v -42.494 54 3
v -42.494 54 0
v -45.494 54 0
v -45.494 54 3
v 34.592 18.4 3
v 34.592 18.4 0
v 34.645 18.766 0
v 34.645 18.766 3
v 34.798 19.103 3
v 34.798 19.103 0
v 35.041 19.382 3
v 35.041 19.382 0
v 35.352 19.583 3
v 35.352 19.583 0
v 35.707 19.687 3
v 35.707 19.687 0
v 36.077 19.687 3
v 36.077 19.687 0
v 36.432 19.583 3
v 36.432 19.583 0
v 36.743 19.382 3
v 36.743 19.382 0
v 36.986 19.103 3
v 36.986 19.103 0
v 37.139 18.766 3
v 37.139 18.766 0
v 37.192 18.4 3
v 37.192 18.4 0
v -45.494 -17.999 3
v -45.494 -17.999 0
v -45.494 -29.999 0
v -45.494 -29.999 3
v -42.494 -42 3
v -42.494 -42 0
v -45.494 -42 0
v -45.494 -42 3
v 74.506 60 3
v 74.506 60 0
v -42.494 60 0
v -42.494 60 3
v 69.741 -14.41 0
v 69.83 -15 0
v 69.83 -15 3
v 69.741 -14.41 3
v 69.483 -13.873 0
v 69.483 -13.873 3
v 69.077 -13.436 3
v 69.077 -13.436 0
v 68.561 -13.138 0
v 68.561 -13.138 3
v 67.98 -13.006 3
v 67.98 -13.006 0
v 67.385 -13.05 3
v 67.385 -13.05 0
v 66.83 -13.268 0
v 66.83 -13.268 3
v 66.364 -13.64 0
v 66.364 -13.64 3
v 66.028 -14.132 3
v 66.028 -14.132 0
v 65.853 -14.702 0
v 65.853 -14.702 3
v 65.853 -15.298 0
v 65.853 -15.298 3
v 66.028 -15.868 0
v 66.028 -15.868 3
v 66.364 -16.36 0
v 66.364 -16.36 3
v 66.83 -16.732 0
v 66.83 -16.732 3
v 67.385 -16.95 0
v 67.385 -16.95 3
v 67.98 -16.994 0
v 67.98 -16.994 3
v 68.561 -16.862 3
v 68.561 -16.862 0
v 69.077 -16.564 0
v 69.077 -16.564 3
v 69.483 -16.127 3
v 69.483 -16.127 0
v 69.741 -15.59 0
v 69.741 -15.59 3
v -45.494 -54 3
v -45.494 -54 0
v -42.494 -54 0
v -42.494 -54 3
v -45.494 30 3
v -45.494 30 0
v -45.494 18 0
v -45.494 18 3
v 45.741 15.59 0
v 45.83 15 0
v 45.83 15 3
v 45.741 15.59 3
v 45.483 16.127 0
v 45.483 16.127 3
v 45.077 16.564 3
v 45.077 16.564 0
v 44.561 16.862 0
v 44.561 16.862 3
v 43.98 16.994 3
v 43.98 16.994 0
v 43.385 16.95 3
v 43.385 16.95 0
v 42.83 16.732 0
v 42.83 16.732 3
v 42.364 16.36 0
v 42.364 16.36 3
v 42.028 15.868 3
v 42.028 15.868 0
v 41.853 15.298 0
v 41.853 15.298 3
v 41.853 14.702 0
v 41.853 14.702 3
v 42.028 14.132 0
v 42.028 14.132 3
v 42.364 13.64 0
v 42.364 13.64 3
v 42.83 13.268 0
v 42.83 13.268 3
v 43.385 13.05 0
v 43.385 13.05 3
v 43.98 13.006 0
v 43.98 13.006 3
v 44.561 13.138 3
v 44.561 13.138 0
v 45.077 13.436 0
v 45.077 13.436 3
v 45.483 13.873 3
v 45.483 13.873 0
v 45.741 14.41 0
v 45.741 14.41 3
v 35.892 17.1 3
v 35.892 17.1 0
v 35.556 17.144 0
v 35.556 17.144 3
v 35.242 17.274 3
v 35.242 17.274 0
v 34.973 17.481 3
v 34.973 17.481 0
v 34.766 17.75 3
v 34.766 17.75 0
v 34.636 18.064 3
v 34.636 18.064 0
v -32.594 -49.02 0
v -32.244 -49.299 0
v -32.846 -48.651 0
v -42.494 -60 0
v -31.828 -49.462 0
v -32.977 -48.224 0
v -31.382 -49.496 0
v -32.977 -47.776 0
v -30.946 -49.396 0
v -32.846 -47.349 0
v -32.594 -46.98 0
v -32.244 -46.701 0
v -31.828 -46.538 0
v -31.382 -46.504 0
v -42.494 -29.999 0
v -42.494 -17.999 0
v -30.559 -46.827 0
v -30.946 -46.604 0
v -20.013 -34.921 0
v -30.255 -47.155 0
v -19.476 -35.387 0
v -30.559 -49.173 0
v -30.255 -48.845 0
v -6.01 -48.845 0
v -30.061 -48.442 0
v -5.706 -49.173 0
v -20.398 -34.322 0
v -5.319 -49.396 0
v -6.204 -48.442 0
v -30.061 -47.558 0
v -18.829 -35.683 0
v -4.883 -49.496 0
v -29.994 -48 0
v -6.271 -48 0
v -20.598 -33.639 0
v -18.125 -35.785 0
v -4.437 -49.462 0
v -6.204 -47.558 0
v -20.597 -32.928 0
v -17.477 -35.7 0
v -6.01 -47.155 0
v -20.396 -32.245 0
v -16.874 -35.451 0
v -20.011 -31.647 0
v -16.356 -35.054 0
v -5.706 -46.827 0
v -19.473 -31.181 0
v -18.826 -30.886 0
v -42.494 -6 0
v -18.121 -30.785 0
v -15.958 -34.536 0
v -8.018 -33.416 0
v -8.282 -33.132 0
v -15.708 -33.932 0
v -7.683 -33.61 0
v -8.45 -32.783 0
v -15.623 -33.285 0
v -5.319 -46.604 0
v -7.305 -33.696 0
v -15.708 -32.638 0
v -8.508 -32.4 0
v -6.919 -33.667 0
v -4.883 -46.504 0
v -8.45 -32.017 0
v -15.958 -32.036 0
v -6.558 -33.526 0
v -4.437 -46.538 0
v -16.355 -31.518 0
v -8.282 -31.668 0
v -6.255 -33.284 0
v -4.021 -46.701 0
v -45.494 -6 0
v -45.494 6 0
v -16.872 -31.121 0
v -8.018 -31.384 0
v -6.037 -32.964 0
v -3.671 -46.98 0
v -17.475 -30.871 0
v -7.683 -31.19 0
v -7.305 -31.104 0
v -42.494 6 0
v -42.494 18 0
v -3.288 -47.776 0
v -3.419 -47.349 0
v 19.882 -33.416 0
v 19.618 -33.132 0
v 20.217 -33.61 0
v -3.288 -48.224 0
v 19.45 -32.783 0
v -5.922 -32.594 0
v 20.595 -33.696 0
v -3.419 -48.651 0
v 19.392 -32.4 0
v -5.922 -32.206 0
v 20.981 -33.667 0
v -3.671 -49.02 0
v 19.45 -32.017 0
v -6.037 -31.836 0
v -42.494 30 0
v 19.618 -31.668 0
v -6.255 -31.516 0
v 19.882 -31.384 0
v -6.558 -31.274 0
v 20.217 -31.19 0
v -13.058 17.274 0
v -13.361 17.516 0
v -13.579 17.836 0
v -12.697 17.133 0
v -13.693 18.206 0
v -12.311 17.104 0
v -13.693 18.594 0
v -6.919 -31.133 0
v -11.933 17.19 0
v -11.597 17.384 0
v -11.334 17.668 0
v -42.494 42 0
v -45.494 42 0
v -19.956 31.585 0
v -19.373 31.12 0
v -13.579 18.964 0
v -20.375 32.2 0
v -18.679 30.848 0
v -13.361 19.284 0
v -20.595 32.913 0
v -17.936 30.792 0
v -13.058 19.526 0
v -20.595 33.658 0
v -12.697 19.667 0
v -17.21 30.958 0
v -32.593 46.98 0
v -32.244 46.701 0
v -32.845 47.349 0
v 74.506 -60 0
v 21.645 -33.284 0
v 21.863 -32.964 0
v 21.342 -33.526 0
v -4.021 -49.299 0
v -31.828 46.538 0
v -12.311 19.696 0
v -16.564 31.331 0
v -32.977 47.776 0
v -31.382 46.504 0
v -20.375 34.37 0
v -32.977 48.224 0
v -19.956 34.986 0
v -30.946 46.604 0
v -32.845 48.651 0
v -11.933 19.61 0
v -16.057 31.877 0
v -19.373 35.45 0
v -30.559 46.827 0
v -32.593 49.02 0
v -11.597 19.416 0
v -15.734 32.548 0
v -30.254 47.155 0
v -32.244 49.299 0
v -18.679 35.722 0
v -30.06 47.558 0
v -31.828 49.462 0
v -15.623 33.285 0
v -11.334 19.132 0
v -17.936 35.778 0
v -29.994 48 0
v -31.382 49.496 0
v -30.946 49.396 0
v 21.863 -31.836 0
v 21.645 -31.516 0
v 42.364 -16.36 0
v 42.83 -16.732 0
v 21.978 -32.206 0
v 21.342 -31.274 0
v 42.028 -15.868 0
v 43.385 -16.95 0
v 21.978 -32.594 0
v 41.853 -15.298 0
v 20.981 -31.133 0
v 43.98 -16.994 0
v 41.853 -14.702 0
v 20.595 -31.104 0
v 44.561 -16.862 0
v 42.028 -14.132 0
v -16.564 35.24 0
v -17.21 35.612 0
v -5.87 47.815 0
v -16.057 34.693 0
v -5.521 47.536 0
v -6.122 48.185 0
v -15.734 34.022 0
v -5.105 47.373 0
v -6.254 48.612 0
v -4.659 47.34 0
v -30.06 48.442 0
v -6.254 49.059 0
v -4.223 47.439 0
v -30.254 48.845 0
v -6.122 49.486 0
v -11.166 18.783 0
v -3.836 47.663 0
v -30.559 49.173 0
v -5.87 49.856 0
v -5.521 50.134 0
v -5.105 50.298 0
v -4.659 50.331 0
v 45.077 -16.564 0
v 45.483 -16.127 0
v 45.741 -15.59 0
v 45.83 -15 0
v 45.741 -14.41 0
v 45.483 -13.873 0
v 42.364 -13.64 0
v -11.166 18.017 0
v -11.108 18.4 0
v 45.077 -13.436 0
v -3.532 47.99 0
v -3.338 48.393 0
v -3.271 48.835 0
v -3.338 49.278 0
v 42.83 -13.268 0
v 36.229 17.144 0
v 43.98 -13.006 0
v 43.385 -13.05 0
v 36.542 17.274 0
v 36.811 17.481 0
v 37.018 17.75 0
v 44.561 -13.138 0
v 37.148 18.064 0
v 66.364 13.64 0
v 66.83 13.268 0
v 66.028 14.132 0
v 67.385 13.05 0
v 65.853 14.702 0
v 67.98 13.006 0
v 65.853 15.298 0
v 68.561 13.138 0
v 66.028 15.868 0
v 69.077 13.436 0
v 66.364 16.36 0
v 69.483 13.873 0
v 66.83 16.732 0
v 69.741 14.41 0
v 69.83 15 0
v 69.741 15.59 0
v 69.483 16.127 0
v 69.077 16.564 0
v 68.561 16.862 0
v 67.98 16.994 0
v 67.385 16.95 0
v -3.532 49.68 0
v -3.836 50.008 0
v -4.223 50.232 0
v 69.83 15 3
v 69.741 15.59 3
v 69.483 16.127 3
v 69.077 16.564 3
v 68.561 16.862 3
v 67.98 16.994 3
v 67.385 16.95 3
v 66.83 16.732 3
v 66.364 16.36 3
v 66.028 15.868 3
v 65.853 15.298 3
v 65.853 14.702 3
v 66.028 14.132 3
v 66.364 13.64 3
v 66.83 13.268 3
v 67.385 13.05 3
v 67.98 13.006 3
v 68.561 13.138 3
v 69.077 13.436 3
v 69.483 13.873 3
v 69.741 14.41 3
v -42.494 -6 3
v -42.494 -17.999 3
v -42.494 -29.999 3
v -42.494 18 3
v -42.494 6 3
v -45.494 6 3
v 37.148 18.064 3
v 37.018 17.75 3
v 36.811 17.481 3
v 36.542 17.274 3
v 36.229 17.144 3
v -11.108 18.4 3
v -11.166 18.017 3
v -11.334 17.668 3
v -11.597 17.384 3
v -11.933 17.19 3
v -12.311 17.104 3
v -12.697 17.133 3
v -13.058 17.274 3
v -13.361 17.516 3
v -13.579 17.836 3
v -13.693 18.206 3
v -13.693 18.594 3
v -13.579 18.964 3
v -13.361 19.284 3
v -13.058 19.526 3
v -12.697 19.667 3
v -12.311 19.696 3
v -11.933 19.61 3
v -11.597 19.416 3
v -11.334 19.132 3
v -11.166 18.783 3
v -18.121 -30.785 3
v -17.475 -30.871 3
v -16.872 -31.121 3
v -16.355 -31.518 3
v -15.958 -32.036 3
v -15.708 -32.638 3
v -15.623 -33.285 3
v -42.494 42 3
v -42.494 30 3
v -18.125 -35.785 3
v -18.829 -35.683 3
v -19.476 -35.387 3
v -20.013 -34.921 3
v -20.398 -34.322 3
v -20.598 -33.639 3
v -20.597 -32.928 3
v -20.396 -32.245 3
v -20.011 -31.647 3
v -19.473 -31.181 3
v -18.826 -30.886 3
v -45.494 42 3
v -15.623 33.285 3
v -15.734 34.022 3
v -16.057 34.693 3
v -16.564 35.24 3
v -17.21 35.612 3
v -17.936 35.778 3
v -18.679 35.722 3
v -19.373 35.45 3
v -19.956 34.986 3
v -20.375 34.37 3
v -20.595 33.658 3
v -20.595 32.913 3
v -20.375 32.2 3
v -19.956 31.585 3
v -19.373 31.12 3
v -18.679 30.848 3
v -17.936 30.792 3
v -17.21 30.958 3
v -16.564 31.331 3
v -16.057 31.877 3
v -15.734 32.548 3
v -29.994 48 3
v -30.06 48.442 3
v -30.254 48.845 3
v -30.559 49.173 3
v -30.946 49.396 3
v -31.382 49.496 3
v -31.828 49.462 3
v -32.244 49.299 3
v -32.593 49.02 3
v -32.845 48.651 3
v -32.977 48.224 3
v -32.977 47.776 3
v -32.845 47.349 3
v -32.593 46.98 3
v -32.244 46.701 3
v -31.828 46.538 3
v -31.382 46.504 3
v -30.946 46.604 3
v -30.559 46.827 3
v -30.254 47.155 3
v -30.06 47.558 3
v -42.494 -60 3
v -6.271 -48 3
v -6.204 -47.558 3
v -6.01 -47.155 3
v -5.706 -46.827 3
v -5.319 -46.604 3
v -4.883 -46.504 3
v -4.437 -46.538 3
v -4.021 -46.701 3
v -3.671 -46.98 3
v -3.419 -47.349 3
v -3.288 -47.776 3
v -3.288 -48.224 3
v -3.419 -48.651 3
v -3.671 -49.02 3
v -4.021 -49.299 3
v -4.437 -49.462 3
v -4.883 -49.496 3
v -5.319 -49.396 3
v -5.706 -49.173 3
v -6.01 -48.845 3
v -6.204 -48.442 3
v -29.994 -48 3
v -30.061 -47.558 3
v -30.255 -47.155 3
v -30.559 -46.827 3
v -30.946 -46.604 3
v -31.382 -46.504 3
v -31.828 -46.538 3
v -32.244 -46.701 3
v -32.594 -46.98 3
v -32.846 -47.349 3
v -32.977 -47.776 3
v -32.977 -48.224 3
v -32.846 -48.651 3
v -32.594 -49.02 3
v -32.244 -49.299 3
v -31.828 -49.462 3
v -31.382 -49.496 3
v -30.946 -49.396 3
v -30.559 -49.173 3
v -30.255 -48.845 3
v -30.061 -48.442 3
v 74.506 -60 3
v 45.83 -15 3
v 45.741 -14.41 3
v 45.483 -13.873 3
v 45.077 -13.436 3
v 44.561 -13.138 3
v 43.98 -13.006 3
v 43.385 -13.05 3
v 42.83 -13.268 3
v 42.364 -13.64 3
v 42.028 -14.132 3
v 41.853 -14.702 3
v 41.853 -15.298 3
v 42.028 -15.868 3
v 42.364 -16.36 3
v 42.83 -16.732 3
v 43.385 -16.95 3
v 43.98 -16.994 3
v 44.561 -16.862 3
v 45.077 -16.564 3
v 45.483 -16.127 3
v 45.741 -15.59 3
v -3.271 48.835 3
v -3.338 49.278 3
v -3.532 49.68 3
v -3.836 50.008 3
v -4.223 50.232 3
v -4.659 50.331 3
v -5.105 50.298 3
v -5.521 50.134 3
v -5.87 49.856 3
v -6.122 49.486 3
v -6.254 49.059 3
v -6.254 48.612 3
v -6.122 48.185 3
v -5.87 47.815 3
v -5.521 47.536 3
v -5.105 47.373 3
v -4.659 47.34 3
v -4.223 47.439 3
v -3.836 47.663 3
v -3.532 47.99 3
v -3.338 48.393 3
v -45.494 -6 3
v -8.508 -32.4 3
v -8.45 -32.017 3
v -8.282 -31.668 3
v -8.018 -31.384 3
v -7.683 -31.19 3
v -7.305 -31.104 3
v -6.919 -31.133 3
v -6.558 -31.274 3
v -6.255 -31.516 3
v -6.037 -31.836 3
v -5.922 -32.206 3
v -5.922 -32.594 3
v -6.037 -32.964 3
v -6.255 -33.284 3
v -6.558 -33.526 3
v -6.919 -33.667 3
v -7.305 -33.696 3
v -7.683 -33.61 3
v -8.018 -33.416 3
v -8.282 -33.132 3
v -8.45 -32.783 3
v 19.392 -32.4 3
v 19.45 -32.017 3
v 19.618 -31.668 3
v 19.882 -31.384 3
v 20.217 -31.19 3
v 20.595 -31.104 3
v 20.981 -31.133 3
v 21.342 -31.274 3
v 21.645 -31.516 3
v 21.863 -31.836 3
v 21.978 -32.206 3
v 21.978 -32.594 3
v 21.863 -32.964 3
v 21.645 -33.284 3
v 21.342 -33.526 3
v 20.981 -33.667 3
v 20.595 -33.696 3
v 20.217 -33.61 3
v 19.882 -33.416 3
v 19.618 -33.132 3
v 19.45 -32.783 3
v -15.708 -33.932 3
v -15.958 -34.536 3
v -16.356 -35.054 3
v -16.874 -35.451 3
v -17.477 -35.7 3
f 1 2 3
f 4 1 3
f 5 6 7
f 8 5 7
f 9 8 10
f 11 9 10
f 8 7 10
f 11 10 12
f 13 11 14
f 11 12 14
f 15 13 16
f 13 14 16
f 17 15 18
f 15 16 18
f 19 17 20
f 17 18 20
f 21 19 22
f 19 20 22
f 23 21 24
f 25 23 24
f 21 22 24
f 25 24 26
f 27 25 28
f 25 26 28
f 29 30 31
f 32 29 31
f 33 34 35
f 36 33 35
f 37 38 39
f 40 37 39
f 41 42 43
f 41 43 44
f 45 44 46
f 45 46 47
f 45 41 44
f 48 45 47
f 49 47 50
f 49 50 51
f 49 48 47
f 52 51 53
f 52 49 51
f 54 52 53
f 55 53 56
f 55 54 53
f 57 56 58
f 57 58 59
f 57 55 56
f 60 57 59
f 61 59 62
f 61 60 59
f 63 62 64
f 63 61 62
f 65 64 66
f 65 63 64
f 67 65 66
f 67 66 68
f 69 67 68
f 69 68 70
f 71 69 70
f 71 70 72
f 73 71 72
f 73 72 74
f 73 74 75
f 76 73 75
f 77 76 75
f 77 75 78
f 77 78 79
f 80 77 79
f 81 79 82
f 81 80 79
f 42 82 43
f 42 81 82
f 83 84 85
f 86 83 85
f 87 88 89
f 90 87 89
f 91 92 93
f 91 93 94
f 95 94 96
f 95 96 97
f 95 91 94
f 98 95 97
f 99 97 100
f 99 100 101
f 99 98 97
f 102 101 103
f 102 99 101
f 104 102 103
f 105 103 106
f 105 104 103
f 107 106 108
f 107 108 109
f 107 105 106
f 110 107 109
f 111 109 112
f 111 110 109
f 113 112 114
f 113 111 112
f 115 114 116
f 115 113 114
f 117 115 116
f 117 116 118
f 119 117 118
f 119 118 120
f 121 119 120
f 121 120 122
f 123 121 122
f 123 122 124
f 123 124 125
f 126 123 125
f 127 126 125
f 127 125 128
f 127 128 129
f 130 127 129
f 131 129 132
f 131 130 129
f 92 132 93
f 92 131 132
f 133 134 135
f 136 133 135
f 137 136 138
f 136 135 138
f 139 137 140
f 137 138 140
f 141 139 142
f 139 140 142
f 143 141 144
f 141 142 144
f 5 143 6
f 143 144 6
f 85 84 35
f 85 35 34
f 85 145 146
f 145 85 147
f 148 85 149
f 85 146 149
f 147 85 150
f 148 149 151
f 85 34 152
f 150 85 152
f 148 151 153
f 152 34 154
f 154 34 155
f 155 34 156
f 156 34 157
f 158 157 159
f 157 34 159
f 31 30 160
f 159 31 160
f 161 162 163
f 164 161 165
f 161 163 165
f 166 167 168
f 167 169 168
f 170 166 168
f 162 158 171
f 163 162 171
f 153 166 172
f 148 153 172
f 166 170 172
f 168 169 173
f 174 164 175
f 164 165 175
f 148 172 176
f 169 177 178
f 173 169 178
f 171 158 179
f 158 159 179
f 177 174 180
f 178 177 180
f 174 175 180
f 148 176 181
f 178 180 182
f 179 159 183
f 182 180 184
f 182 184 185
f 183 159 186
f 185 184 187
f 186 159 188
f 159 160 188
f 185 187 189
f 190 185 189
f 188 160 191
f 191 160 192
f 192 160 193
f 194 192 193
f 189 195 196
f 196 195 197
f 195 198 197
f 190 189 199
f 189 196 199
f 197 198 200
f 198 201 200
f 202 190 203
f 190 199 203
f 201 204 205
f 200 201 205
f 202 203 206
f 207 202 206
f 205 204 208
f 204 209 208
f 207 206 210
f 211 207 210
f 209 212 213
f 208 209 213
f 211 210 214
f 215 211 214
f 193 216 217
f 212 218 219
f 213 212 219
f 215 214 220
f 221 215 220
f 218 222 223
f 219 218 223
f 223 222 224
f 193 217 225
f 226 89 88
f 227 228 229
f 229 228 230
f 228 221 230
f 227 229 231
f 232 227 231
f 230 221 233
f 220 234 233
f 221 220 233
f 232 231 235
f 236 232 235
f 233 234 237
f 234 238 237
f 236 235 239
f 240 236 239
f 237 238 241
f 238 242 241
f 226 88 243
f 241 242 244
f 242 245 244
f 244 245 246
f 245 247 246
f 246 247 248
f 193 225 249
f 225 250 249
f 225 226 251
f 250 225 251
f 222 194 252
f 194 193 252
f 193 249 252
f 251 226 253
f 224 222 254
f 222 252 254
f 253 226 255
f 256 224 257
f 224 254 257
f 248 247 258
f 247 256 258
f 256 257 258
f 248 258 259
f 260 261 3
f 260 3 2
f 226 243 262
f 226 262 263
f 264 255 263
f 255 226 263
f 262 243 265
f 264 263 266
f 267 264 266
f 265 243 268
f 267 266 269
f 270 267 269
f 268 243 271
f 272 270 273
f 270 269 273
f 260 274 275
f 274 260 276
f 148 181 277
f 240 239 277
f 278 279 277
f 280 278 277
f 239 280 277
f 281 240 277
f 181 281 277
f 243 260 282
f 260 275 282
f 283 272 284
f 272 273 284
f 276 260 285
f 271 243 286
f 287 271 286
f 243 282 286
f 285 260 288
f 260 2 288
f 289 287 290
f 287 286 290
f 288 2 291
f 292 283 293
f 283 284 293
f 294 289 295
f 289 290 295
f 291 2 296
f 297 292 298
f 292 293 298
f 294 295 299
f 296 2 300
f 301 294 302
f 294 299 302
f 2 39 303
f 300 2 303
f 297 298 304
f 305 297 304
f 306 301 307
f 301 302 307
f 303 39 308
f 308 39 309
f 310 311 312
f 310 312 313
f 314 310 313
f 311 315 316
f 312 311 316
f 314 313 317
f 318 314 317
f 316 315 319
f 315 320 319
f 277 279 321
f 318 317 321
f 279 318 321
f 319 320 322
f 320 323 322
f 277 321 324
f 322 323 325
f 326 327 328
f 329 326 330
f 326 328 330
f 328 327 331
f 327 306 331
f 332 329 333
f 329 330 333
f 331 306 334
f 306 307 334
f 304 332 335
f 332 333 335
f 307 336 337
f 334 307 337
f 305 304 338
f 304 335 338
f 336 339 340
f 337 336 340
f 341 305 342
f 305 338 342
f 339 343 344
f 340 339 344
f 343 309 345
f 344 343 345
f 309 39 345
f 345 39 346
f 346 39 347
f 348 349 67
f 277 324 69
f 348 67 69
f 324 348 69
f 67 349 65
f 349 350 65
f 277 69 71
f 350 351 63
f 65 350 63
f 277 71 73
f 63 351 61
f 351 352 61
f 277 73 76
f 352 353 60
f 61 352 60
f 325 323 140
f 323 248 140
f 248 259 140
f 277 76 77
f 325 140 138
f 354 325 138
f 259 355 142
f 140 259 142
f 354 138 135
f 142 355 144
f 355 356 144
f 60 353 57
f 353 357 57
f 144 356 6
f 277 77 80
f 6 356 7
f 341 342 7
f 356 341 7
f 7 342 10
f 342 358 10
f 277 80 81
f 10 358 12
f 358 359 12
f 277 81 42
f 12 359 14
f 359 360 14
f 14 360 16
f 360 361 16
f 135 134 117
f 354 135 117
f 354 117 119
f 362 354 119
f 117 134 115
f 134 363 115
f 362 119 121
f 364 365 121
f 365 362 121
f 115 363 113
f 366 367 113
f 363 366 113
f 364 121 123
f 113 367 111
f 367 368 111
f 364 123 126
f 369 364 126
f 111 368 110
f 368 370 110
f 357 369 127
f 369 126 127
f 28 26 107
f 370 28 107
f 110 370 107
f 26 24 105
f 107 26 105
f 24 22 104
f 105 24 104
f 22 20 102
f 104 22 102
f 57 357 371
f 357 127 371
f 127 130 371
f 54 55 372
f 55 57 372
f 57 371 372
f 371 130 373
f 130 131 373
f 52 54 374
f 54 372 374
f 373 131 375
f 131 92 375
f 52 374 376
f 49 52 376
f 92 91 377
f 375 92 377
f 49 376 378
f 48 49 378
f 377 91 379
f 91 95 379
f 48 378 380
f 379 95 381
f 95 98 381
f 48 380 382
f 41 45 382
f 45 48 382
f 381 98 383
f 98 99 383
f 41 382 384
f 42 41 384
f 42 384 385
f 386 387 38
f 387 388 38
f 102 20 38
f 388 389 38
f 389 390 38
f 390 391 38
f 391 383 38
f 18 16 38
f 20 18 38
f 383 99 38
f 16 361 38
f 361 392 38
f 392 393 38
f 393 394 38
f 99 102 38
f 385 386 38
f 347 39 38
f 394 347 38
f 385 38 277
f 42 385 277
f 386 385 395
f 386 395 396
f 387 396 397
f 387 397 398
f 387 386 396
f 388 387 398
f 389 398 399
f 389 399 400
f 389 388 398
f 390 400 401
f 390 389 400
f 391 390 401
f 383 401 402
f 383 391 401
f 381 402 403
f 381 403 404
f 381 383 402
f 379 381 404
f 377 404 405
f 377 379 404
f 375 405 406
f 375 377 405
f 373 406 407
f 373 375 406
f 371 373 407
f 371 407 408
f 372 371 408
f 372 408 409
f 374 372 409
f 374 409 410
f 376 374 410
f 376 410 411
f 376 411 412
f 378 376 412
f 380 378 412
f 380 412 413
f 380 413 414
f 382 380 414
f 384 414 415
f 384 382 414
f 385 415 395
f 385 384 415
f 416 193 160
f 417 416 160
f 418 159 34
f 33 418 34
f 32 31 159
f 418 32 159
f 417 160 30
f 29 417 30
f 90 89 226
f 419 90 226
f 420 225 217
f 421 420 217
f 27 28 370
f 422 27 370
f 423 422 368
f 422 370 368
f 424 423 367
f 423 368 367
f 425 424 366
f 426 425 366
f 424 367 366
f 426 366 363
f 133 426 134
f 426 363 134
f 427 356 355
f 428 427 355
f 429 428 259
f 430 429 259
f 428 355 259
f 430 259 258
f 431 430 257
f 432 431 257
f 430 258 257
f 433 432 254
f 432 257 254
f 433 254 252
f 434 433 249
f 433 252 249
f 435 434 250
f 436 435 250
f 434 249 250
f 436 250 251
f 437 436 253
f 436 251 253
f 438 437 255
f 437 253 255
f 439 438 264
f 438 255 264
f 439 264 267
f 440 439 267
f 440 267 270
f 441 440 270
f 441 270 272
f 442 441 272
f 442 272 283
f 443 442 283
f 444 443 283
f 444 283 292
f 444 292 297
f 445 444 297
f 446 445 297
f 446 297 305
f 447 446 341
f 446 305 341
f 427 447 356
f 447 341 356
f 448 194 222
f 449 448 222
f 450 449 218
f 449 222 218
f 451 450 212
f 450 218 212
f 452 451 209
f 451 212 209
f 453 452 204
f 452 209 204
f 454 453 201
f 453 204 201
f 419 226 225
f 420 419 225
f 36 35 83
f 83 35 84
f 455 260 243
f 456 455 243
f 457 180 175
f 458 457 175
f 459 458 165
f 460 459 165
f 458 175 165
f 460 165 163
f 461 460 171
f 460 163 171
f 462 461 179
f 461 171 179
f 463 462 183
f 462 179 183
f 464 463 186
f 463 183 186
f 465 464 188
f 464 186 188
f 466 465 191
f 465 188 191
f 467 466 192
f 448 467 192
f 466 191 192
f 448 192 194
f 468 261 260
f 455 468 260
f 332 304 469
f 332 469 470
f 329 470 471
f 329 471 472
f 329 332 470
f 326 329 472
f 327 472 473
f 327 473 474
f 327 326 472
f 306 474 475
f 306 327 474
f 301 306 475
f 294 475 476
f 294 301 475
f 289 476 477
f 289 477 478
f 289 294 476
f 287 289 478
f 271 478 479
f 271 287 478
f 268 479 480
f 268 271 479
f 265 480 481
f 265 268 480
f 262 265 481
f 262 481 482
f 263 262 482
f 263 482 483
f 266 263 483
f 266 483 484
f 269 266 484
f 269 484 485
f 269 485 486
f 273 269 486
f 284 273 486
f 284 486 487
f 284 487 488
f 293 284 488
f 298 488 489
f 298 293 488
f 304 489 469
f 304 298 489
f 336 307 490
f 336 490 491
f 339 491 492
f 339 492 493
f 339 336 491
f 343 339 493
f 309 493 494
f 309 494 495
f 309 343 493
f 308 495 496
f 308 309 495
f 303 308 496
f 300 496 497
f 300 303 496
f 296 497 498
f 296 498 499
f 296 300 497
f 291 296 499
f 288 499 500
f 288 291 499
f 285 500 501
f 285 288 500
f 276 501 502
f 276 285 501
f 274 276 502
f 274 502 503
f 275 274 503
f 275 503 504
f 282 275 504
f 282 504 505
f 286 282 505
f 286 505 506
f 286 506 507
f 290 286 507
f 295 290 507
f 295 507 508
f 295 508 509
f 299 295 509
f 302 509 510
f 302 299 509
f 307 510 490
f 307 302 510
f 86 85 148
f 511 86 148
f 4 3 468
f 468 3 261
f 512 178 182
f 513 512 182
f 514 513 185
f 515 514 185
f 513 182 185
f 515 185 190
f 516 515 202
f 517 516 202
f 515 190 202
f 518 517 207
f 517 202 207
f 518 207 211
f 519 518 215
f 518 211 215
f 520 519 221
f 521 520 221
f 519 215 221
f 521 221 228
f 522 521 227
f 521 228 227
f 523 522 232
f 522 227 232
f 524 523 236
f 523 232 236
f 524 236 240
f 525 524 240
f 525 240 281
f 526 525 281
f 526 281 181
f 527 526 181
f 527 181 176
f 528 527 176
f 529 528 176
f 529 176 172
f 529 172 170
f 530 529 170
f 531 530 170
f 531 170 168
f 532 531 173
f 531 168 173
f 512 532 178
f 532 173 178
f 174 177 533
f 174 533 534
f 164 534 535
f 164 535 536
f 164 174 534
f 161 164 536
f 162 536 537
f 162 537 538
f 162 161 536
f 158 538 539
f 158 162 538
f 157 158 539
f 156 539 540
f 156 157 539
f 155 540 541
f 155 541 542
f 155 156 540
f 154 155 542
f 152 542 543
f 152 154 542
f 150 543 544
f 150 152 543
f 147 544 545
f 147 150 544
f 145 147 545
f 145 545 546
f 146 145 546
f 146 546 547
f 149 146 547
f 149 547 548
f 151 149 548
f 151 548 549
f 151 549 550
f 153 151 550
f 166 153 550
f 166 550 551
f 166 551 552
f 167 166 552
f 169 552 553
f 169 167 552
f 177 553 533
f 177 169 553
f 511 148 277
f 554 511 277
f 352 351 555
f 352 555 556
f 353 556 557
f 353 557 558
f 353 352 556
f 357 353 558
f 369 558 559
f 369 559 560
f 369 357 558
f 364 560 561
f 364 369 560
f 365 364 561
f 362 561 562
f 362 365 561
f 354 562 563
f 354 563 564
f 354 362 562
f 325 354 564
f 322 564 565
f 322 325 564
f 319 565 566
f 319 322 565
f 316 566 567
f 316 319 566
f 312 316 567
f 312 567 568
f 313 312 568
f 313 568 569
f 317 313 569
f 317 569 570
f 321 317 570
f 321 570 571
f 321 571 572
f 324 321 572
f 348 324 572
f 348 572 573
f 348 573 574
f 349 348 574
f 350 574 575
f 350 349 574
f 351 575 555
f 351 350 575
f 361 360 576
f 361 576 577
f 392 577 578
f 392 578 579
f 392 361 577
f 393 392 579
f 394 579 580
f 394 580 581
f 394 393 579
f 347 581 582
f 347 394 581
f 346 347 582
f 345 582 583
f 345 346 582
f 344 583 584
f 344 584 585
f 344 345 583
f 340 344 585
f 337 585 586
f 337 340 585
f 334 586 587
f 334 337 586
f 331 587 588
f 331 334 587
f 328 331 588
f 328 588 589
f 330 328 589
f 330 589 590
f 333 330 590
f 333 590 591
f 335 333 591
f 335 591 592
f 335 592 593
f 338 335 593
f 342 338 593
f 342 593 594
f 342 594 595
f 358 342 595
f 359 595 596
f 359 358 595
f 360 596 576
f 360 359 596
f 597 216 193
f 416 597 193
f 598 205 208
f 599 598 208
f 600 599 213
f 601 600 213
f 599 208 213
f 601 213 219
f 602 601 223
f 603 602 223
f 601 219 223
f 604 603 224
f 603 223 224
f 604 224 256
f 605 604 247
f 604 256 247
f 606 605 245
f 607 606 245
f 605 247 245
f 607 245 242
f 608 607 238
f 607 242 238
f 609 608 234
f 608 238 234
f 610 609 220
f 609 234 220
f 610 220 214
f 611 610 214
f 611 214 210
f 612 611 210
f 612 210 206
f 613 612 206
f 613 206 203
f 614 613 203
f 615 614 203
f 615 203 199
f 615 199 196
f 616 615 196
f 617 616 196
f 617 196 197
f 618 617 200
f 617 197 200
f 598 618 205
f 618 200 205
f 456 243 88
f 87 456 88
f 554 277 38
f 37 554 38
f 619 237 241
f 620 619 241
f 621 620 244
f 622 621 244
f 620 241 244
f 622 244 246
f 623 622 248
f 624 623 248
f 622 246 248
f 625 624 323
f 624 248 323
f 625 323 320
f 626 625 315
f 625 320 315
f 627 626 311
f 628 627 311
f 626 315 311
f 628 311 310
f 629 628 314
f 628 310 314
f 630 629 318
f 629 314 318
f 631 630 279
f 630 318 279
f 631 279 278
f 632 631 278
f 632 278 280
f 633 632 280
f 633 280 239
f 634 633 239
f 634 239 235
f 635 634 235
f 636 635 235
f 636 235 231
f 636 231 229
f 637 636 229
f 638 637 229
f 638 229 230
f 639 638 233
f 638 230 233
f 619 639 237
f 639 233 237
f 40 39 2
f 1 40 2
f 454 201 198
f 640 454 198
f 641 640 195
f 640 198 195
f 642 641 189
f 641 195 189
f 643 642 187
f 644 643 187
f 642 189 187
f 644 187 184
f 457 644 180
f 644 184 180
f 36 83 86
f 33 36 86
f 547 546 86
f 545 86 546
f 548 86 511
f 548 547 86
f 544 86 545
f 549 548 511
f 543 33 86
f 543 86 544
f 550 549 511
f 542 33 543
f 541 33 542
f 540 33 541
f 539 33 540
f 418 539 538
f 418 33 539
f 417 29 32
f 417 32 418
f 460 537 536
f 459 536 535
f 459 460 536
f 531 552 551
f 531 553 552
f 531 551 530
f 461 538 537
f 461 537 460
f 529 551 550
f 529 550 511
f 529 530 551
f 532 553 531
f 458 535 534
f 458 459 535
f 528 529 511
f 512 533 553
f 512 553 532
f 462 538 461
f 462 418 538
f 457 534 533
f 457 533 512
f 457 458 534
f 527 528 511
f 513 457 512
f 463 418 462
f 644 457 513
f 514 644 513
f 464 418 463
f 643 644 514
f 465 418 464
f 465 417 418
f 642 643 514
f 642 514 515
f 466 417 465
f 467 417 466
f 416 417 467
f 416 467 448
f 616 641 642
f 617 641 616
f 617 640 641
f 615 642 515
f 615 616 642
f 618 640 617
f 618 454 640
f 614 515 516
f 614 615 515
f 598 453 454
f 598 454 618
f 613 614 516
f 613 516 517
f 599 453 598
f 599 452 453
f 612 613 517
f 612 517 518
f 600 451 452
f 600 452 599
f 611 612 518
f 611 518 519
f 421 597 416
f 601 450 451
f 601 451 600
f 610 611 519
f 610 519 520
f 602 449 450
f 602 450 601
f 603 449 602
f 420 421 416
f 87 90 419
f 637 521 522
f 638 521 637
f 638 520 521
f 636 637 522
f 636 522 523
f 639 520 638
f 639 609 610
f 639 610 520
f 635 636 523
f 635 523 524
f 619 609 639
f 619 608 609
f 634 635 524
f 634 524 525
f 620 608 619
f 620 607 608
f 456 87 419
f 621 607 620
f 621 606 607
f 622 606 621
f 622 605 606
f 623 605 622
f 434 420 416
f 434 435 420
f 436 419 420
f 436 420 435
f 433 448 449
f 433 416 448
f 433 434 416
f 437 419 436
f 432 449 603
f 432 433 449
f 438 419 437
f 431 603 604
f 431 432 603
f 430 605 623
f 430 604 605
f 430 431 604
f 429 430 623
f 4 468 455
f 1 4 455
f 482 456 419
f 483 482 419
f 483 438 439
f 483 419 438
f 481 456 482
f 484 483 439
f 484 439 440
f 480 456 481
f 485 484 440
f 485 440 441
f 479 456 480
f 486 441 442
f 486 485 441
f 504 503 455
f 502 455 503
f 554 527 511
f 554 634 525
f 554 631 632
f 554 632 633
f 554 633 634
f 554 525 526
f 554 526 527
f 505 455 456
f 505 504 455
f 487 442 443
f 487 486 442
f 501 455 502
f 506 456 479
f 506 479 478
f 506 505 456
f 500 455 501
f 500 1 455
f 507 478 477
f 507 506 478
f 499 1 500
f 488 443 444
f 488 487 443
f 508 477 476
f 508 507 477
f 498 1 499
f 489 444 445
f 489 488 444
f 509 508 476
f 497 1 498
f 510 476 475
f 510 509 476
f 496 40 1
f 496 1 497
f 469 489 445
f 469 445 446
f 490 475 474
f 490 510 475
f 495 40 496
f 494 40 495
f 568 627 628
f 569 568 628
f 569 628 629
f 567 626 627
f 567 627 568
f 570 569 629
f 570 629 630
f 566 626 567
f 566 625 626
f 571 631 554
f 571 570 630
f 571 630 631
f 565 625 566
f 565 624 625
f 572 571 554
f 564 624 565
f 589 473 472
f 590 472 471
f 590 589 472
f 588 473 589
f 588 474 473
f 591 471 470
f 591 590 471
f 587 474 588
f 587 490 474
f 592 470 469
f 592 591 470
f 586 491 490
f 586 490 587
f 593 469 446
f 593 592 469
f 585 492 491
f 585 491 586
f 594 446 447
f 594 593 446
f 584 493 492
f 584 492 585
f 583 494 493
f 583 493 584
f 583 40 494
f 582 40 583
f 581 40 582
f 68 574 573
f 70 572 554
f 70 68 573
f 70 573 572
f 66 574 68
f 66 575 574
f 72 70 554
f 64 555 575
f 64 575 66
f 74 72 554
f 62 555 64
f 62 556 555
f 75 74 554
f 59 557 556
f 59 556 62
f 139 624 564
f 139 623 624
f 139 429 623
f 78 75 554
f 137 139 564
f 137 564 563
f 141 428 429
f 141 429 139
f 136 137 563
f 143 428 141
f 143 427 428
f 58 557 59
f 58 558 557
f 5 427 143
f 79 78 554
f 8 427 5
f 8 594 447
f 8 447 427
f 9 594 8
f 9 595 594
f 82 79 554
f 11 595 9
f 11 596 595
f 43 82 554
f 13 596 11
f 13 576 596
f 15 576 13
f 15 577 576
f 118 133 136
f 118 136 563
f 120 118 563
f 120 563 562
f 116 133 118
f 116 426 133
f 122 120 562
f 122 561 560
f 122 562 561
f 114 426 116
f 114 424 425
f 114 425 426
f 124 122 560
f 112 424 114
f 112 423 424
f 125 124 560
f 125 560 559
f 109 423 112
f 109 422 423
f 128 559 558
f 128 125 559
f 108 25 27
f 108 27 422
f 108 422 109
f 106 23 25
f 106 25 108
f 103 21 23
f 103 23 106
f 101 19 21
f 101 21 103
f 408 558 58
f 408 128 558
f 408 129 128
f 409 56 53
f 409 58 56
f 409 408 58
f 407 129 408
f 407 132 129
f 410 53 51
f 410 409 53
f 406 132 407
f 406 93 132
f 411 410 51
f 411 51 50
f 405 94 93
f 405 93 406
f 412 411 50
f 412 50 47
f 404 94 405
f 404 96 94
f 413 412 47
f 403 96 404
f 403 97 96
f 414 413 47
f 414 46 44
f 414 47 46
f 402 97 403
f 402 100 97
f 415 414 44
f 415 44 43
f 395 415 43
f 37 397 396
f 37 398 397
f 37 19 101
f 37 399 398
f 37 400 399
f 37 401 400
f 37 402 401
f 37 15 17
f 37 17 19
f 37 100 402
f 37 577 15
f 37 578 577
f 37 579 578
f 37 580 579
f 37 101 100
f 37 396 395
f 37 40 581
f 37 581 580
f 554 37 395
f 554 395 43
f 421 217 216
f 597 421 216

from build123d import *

# Parameters (mm, degrees)
F0_R     = 1.5
F0_R_2   = 2
F0_R_3   = 2.5
F1_DEPTH = 3


with BuildPart() as f1:
    # F0 (on Top) → F1 (new body)
    with BuildSketch(Plane.XY):
        Polygon((74.5058632415, 0), (74.5058632415, 60), (-42.4941367585, 60), (-42.4941367585, 54), (-45.4941367585, 54), (-45.4941367585, 42), (-42.4941367585, 42), (-42.4941367585, 30), (-45.4941367585, 30), (-45.4941367585, 18), (-42.4941367585, 18), (-42.4941367585, 6), (-45.4941367585, 6), (-45.4941367585, -6), (-42.4941367585, -6), (-42.4941367585, -17.9991139914), (-45.4941367585, -17.9991139914), (-45.4941367585, -29.9991139914), (-42.4941367585, -29.9991139914), (-42.4941367585, -42), (-45.4941367585, -42), (-45.4941367585, -54), (-42.4941367585, -54), (-42.4941367585, -60), (74.5058632415, -60), align=None)
        with Locations((-31.4941367585, -48)):
            Circle(F0_R, mode=Mode.SUBTRACT)
        with BuildLine():
            ThreePointArc((-15.6229661617, -33.2851748408), (-16.3557725378, -35.053514937), (-18.1245875184, -35.785174315))
            ThreePointArc((-18.1245875184, -35.785174315), (-20.6229656359, -33.2835534841), (-18.1213448049, -30.7851753666))
            ThreePointArc((-18.1213448049, -30.7851753666), (-16.3546260654, -31.517981217), (-15.6229661617, -33.2851748408))
        make_face(mode=Mode.SUBTRACT)
        with BuildLine():
            ThreePointArc((-3.2708819532, -48), (-4.7708819532, -49.5), (-6.2708819532, -48))
            ThreePointArc((-6.2708819532, -48), (-4.7708819532, -46.5), (-3.2708819532, -48))
        make_face(mode=Mode.SUBTRACT)
        with BuildLine():
            Line((35.8920598827, 17.1), (35.8920598827, 0))
            Line((35.8920598827, 0), (35.8920598827, -32.4))
            Line((35.8920598827, -32.4), (21.9920598827, -32.4))
            ThreePointArc((21.9920598827, -32.4), (20.6920598827, -33.7), (19.3920598827, -32.4))
            Line((19.3920598827, -32.4), (-5.9079401173, -32.4))
            ThreePointArc((-5.9079401173, -32.4), (-7.2079401173, -33.7), (-8.5079401173, -32.4))
            Line((-8.5079401173, -32.4), (-12.4079401173, -32.4))
            Line((-12.4079401173, -32.4), (-12.4079401173, 17.1))
            ThreePointArc((-12.4079401173, 17.1), (-13.3271789328, 19.3192388155), (-11.1079401173, 18.4))
            Line((-11.1079401173, 18.4), (34.5920598827, 18.4))
            ThreePointArc((34.5920598827, 18.4), (35.8920598827, 19.7), (37.1920598827, 18.4))
            ThreePointArc((37.1920598827, 18.4), (36.8112986983, 17.4807611845), (35.8920598827, 17.1))
        make_face(mode=Mode.SUBTRACT)
        with Locations((43.8302124143, -15)):
            Circle(F0_R_2, mode=Mode.SUBTRACT)
        with Locations((67.8302124143, -15)):
            Circle(F0_R_2, mode=Mode.SUBTRACT)
        with Locations((-18.1229661617, 33.2851748408)):
            Circle(F0_R_3, mode=Mode.SUBTRACT)
        with Locations((-31.4937761504, 48)):
            Circle(F0_R, mode=Mode.SUBTRACT)
        with Locations((-4.7708819532, 48.8354042139)):
            Circle(F0_R, mode=Mode.SUBTRACT)
        with Locations((43.8302124143, 15)):
            Circle(F0_R_2, mode=Mode.SUBTRACT)
        with Locations((67.8302124143, 15)):
            Circle(F0_R_2, mode=Mode.SUBTRACT)
        with BuildLine():
            Line((35.8920598827, -32.4), (35.8920598827, 0))
            Line((35.8920598827, 0), (35.8920598827, 17.1))
            ThreePointArc((35.8920598827, 17.1), (34.9728210672, 17.4807611845), (34.5920598827, 18.4))
            Line((34.5920598827, 18.4), (-11.1079401173, 18.4))
            ThreePointArc((-11.1079401173, 18.4), (-11.4887013017, 17.4807611845), (-12.4079401173, 17.1))
            Line((-12.4079401173, 17.1), (-12.4079401173, -32.4))
            Line((-12.4079401173, -32.4), (-8.5079401173, -32.4))
            ThreePointArc((-8.5079401173, -32.4), (-7.2079401173, -31.1), (-5.9079401173, -32.4))
            Line((-5.9079401173, -32.4), (19.3920598827, -32.4))
            ThreePointArc((19.3920598827, -32.4), (20.6920598827, -31.1), (21.9920598827, -32.4))
            Line((21.9920598827, -32.4), (35.8920598827, -32.4))
        make_face()
    extrude(amount=F1_DEPTH)


solid = f1.part
